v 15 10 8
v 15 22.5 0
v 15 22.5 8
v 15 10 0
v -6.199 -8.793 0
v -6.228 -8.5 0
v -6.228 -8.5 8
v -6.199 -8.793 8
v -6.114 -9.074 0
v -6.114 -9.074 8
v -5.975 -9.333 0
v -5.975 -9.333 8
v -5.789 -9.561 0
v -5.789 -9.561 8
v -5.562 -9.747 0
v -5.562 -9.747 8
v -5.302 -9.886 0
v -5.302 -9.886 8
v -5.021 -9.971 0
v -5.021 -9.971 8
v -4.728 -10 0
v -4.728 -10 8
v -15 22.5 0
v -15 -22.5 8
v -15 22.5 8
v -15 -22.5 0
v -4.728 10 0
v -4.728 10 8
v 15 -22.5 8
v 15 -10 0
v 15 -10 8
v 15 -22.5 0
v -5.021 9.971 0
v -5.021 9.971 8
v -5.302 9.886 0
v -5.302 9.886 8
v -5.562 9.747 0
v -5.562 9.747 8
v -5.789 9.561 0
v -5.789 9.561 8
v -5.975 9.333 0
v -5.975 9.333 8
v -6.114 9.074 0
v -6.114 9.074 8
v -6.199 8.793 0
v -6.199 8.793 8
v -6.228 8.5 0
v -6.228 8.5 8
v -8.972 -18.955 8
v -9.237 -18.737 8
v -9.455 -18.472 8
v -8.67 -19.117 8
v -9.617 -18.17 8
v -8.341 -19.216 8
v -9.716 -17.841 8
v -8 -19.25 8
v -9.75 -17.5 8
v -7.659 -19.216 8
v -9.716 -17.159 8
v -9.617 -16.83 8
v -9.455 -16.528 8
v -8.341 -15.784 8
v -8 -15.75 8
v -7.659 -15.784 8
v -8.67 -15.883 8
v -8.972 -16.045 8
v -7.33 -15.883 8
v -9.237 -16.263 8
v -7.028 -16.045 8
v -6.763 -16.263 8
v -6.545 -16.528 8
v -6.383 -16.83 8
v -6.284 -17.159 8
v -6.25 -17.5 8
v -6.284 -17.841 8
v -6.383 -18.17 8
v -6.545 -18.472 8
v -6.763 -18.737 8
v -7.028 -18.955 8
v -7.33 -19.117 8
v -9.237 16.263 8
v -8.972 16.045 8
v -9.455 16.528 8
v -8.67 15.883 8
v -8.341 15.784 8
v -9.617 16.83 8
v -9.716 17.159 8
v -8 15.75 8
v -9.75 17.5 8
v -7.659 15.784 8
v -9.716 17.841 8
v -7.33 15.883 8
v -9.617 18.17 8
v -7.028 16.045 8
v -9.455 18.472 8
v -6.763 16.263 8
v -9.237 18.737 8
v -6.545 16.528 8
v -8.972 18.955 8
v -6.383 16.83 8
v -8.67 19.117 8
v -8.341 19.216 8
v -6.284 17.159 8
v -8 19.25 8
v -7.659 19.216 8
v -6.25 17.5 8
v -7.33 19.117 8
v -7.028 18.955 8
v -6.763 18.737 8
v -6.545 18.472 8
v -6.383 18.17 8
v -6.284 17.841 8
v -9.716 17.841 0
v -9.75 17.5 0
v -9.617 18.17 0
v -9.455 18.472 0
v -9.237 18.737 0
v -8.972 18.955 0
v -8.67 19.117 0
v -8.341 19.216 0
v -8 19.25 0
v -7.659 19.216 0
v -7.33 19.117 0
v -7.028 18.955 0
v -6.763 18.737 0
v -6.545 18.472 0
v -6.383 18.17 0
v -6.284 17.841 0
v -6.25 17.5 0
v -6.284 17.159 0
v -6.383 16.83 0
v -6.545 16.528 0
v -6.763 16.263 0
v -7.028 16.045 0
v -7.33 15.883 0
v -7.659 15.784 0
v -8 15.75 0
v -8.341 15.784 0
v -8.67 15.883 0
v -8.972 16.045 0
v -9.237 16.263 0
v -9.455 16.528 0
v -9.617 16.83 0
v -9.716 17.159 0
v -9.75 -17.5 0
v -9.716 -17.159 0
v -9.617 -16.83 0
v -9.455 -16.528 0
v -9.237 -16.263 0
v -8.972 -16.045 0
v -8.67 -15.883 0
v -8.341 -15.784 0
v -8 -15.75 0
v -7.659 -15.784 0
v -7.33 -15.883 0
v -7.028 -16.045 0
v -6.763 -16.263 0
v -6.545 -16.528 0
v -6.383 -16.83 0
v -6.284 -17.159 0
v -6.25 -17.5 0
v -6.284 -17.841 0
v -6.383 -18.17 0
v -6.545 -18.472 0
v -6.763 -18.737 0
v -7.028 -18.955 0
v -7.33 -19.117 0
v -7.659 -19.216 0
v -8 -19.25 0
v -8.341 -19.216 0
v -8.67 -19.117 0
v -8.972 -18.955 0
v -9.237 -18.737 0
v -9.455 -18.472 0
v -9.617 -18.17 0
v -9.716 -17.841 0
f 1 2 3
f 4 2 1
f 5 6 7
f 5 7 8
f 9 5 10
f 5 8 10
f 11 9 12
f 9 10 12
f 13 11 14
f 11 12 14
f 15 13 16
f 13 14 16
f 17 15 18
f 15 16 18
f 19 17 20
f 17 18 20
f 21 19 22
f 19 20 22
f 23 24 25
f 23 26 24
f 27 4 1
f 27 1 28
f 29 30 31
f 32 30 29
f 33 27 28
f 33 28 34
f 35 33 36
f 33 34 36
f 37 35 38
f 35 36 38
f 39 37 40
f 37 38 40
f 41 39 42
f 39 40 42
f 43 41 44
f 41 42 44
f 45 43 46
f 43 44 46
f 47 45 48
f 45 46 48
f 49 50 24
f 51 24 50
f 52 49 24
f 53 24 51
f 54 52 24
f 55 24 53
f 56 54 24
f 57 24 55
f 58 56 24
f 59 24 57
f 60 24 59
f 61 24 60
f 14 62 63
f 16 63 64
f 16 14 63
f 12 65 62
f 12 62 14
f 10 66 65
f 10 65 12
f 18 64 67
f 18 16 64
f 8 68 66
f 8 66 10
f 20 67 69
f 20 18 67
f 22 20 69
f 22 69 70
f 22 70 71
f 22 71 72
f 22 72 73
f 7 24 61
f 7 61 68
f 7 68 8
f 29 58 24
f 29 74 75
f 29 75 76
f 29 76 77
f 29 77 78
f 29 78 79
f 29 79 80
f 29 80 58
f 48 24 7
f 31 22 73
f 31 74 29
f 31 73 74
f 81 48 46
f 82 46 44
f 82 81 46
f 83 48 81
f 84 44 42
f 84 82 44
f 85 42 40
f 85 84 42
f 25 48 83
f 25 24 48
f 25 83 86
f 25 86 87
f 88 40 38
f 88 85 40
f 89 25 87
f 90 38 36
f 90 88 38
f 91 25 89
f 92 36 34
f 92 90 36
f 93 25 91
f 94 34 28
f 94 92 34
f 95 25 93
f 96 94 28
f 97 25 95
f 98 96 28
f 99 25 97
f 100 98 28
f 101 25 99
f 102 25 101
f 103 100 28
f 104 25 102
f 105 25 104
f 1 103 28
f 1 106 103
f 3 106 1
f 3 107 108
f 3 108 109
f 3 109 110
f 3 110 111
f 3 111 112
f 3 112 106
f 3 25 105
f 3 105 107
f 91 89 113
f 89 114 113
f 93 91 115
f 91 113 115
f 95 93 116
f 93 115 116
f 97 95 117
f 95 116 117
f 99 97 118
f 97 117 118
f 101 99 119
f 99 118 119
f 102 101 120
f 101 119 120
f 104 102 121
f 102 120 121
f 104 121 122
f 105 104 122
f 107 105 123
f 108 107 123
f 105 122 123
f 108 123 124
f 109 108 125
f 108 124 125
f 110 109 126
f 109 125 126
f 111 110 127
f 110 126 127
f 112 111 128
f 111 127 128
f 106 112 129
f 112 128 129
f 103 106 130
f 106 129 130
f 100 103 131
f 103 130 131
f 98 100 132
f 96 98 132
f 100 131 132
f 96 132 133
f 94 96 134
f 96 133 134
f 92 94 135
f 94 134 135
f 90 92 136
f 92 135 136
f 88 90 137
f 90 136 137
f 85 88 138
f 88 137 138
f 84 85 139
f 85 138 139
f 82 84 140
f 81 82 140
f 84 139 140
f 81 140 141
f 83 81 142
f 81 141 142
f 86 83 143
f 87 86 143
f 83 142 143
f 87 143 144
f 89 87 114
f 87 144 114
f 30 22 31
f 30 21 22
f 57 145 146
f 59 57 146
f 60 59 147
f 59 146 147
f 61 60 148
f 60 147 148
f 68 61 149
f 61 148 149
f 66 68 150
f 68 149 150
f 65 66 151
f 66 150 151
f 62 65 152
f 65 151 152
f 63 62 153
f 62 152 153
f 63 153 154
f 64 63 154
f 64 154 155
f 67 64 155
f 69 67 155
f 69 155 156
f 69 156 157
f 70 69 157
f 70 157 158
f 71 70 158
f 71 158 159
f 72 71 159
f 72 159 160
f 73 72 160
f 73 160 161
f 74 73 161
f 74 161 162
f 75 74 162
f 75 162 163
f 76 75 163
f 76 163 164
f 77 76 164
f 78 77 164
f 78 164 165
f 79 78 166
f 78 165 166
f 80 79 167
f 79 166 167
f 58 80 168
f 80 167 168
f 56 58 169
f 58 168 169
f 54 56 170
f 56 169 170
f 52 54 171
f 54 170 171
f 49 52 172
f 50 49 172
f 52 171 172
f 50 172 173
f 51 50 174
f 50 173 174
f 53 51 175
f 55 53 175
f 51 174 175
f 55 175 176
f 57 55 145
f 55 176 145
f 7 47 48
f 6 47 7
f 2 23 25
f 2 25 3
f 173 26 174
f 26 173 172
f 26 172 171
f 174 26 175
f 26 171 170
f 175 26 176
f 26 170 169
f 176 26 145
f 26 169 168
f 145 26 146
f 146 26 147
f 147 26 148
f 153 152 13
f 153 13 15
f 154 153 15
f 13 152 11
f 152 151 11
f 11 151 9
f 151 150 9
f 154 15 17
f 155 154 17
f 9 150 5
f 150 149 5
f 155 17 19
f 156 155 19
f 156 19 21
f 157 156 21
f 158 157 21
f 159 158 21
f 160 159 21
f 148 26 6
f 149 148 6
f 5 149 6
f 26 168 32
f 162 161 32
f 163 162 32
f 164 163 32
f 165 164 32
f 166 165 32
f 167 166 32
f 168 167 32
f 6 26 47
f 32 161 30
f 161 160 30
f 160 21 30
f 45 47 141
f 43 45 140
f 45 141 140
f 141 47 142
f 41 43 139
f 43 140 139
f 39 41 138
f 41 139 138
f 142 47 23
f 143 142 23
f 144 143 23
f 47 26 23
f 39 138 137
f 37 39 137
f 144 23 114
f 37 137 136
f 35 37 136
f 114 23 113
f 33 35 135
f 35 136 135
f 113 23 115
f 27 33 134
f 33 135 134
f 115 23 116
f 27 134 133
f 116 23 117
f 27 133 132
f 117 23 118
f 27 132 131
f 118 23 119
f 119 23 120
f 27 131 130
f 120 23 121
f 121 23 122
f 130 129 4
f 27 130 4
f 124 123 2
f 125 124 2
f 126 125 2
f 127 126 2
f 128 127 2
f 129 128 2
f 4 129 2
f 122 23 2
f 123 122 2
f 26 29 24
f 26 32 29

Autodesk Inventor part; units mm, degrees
ref_plane "YZ Plane" through (0, 0, 0) normal (1, 0, 0) x (0, 1, 0)
ref_plane "XZ Plane" through (0, 0, 0) normal (0, 1, 0) x (-1, 0, 0)
ref_plane "XY Plane" through (0, 0, 0) normal (0, 0, 1) x (1, 0, 0)
sketch "Sketch1" plane through (0, 0, 0) normal (0, 0, 1) x (1, 0, 0)
  line L0 (-15, 22.5) -> (15, 22.5)
  line L1 (15, 22.5) -> (15, -22.5)
  line L2 (15, -22.5) -> (-15, -22.5)
  line L3 (-15, -22.5) -> (-15, 22.5)
  point P0 (0, 0)
  point P1 (0, 22.5)
  point P2 (-15, 0)
  dimension "d0" = 30
  dimension "d1" = 45
extrude "Extrusion1" add sketch "Sketch1" along normal blind 8
sketch "Sketch3" plane through (0, 0, 0) normal (0, 0, -1) x (-1, 0, 0)
  arc A0 (6.2282, -0.4043) -> (6.2368, 0) centre (-3.25, 0) ccw projected
  line L0 (6.2282, -10) -> (-15, -10)
  line L1 (-15, -10) -> (-15, 10)
  line L2 (-15, 10) -> (6.2282, 10)
  line L3 (6.2282, 10) -> (6.2282, -10)
  line L4 (15, 22.5) -> (15, -22.5) projected
  line L5 (-15, -22.5) -> (-15, 22.5) projected
  point P0 (0, 0)
  point P1 (6.2282, 0)
  point P2 (15, 0)
  dimension "d8" = 0
  dimension "d9" = 20
extrude "Extrusion3" cut sketch "Sketch3" against normal blind 10
sketch "Sketch4" plane through (0, 0, 0) normal (0, 0, -1) x (-1, 0, 0)
  line L0 (-15, -22.5) -> (-15, -10) projected
  line L1 (-15, 10) -> (-15, 22.5) projected
  circle A0 centre (8, 17.5) radius 1.75
  circle A1 centre (8, -17.5) radius 1.75
  line L2 (-15, 22.5) -> (15, 22.5) projected
  line L3 (15, 22.5) -> (15, -22.5) projected
  line L4 (15, -22.5) -> (-15, -22.5) projected
  point P0 (-15, -16.25)
  point P1 (-15, 16.25)
  dimension "d17" = 3.5
  dimension "d18" = 3.5
  dimension "d19" = 5
  dimension "d20" = 7
  dimension "d21" = 5
  dimension "d22" = 35
extrude "Extrusion4" cut sketch "Sketch4" against normal through all
fillet "Fillet1" radius 1.5 2 edges at (-6.2282, -10, 4) (-6.2282, 10, 4)
equation "\"d21\" = d19"
properties part number "0005-10-004 Actionare 2 seringa"
